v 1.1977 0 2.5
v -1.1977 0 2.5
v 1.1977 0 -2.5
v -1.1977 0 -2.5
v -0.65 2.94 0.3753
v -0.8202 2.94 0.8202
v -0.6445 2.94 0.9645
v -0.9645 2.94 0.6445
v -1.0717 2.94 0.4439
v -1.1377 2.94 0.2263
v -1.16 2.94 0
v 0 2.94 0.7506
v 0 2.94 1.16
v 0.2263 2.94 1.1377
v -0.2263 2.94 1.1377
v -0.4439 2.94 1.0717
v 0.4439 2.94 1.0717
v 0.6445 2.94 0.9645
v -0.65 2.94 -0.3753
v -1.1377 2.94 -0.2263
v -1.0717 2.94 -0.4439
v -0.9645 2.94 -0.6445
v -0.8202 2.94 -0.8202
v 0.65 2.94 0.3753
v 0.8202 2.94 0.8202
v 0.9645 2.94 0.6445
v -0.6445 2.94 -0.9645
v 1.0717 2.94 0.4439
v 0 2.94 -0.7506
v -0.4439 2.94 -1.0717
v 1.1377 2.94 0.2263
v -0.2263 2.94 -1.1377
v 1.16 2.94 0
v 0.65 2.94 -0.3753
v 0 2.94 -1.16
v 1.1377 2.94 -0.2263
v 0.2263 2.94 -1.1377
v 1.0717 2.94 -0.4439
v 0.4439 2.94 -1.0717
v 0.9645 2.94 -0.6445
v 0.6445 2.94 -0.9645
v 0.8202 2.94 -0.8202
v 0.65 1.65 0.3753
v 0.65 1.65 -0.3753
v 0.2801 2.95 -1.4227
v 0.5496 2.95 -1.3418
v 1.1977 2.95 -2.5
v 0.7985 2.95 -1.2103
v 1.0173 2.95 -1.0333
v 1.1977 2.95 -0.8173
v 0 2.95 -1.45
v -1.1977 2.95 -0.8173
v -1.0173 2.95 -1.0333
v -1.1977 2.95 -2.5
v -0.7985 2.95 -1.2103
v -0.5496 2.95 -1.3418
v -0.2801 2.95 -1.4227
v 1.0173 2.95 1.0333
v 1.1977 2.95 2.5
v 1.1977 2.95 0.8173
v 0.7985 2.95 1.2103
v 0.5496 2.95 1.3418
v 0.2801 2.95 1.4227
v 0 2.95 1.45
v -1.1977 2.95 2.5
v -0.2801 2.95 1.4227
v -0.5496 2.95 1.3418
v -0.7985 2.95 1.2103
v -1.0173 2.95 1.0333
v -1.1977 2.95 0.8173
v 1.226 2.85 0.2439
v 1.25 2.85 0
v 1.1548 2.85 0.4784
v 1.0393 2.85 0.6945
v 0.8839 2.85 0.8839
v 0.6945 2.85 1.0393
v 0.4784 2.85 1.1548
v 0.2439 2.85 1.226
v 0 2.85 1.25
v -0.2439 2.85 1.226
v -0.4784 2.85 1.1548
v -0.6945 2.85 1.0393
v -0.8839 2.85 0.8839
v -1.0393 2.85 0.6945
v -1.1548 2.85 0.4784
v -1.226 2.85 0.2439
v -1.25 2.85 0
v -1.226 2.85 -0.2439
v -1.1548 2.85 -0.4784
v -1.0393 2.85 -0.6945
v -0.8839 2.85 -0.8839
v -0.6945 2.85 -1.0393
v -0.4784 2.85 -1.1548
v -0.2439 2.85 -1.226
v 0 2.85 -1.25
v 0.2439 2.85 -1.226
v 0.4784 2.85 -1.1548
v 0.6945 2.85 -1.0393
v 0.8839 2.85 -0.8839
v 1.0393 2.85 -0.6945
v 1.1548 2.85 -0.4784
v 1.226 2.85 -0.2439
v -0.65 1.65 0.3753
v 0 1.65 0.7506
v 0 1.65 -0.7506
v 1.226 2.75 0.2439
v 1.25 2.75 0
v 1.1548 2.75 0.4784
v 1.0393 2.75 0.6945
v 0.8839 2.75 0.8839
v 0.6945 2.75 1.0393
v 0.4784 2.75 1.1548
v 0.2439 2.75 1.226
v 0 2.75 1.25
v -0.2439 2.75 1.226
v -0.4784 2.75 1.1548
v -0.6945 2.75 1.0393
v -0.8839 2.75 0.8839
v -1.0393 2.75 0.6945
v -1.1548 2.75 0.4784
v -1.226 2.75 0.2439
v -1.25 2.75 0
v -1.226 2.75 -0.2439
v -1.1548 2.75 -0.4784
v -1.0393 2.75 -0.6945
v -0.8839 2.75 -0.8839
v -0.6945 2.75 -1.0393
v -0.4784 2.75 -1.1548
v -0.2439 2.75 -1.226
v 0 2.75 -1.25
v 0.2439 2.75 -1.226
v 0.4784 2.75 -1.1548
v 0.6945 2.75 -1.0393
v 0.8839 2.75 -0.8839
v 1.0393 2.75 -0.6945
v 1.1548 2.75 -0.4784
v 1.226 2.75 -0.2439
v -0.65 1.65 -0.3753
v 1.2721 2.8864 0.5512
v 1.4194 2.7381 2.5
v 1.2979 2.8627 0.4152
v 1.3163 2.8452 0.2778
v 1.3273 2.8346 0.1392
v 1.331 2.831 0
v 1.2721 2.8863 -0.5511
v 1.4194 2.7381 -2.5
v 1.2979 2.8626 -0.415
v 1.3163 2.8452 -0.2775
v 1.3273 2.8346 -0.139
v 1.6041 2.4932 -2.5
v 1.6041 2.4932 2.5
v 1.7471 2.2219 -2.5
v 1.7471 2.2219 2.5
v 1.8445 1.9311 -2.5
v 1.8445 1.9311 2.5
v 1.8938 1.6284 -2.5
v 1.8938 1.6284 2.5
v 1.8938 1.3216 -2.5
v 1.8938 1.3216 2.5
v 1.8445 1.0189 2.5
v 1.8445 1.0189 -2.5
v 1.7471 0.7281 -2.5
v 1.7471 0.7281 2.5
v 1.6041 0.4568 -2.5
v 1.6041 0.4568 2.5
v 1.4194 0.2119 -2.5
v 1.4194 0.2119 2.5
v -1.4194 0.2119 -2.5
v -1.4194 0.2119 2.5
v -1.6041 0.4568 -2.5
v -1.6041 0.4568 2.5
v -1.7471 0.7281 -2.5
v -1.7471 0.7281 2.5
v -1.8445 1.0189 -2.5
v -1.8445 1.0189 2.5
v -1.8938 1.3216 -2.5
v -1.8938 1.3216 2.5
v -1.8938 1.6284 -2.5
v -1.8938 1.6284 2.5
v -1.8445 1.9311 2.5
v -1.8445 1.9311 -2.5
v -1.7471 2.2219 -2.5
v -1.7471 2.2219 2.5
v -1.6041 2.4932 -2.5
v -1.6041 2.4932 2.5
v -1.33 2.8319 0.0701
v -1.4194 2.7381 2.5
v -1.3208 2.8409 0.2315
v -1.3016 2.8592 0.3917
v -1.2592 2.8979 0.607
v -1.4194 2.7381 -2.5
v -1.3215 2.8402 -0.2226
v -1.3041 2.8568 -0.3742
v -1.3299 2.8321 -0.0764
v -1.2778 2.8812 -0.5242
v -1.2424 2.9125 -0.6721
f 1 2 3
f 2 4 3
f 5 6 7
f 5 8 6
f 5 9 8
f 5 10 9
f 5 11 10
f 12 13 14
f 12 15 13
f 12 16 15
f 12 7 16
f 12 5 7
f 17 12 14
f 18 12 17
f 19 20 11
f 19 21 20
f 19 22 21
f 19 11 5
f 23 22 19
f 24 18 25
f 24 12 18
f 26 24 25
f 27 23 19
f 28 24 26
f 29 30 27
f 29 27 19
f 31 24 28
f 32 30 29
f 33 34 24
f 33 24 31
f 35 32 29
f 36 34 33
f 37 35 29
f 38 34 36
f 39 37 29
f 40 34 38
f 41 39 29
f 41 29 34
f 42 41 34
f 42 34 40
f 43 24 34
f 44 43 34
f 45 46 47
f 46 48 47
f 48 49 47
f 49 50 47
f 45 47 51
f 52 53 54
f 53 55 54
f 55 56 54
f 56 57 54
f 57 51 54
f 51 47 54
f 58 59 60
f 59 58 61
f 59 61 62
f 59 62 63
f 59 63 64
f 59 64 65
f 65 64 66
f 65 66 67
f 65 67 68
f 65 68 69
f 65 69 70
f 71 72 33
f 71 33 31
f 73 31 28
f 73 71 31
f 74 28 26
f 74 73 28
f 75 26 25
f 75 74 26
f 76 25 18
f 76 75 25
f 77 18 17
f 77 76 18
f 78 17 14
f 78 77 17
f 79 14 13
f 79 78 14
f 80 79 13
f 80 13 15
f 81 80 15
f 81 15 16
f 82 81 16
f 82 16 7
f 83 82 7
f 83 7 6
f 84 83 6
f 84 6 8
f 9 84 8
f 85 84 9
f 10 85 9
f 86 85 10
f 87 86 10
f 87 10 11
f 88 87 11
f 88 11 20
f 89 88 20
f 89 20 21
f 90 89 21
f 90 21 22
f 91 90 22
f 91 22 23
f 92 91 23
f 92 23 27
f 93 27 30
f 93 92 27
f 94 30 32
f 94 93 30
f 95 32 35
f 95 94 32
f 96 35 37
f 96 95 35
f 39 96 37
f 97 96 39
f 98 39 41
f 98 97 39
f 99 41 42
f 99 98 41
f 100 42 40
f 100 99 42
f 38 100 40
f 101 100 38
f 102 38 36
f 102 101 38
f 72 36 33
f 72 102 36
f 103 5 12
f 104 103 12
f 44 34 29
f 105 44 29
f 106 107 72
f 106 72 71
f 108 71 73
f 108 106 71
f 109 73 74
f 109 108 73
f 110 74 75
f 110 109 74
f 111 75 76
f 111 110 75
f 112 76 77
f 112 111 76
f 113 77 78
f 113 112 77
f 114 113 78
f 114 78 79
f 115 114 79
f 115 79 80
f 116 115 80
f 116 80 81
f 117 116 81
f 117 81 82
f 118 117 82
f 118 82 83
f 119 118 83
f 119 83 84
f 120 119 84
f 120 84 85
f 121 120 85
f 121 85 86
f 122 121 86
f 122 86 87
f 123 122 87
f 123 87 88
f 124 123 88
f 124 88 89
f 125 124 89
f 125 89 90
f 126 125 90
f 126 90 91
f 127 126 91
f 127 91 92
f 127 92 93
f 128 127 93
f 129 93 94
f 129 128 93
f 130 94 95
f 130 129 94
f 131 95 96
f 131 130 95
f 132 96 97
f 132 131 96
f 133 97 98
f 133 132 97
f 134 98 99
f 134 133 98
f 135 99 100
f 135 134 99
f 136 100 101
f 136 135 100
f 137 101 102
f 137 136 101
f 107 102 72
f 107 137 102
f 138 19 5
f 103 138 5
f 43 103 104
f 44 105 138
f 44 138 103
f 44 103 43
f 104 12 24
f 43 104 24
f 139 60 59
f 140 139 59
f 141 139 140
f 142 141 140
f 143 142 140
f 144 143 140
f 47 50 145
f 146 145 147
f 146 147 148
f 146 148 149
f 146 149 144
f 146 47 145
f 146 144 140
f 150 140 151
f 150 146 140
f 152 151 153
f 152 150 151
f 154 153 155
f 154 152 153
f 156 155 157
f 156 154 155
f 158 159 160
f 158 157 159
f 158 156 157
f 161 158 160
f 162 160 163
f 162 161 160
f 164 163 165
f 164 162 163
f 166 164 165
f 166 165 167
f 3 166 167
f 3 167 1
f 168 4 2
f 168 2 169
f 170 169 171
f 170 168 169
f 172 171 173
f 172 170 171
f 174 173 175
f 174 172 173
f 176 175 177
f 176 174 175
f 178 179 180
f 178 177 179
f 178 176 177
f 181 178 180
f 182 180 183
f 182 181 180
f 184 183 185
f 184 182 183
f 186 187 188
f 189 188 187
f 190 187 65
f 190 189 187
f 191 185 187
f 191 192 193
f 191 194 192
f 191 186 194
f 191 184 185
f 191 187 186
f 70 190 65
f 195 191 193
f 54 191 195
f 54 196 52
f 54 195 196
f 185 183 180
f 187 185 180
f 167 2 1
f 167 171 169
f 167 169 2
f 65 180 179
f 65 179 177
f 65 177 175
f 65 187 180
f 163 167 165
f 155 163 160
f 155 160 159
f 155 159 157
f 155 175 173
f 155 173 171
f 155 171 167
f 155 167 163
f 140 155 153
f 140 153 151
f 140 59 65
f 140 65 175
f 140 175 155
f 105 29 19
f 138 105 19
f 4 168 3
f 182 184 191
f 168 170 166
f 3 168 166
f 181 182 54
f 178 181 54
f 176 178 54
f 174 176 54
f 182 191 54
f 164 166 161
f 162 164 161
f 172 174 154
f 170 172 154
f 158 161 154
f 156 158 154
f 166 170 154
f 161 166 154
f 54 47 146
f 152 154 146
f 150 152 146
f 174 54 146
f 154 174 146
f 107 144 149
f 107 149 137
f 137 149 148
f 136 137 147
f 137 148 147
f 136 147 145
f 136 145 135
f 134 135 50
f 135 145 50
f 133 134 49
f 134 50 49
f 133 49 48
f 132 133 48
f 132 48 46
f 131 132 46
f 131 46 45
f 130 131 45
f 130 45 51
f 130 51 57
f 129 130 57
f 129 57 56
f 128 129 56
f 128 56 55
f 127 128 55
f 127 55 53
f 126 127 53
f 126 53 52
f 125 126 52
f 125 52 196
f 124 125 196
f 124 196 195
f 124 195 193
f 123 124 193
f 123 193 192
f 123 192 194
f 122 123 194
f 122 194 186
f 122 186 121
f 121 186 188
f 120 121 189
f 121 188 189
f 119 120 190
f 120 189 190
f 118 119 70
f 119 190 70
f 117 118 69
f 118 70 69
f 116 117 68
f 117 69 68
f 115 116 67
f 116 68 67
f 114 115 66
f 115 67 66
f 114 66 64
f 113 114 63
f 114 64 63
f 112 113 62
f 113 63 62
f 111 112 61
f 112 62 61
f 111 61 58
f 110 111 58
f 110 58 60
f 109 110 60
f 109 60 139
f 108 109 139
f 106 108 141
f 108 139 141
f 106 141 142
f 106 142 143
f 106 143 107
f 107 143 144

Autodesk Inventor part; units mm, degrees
sketch "Sketch_1" plane through (0, 0, 0) normal (0, 0, 1) x (1, 0, 0)
  arc A0 (-1.1977, 2.95) -> (-1.1977, 0) centre (0, 1.475) ccw
  line L0 (-1.1977, 0) -> (1.1977, 0)
  arc A1 (1.1977, 0) -> (1.1977, 2.95) centre (0, 1.475) ccw
  line L1 (1.1977, 2.95) -> (-1.1977, 2.95)
extrude "Extrusion1" add sketch "Sketch_1" along normal mid plane 5
sketch "Sketch_2" plane through (0, 0, 0) normal (0, 0, 1) x (1, 0, 0)
  line L0 (0, 0) -> (0, 2.95)
  line L1 (1.15, 2.95) -> (1.25, 2.85)
  line L2 (1.25, 2.85) -> (1.25, 2.75)
  line L3 (1.25, 2.75) -> (1.45, 2.95)
  line L4 (1.45, 2.95) -> (1.15, 2.95)
revolve "Revolution1" cut sketch "Sketch_2" angle 360 about axis through (0, 0, 0) along (0, -1, 0)
sketch "Sketch_3" plane through (0, 2.95, 0) normal (0, 1, 0) x (1, 0, 0)
  line L0 (-0.65, -0.3753) -> (0, -0.7506)
  line L1 (0, -0.7506) -> (0.65, -0.3753)
  line L2 (0.65, -0.3753) -> (0.65, 0.3753)
  line L3 (0.65, 0.3753) -> (0, 0.7506)
  line L4 (0, 0.7506) -> (-0.65, 0.3753)
  line L5 (-0.65, 0.3753) -> (-0.65, -0.3753)
extrude "Extrusion2" cut sketch "Sketch_3" against normal blind 1.3
sketch "Sketch_5" plane through (0, 2.95, 0) normal (0, 1, 0) x (1, 0, 0)
  circle A0 centre (0, 0) radius 1.3
extrude "Extrusion3" cut sketch "Sketch_5" against normal blind 0.01
ref_plane "an_XY" through (0, 1.475, 2.5) normal (0, 0, 1) x (1, 0, 0)
ref_plane "an_YZ" through (0, 1.475, 2.5) normal (1, 0, 0) x (0, 1, 0)
ref_plane "an_ZX" through (0, 1.475, 2.5) normal (0, 1, 0) x (0, 0, 1)
ref_plane "ans_mms_p_XY" through (0, 1.475, 0) normal (0, 0, 1) x (1, 0, 0)
ref_plane "ans_mms_p_YZ" through (0, 1.475, 0) normal (1, 0, 0) x (0, 1, 0)
ref_plane "ans_mms_p_ZX" through (0, 1.475, 0) normal (0, 1, 0) x (0, 0, 1)
properties part number "SCHUNK-9949504 limit stop for MMS-P"
